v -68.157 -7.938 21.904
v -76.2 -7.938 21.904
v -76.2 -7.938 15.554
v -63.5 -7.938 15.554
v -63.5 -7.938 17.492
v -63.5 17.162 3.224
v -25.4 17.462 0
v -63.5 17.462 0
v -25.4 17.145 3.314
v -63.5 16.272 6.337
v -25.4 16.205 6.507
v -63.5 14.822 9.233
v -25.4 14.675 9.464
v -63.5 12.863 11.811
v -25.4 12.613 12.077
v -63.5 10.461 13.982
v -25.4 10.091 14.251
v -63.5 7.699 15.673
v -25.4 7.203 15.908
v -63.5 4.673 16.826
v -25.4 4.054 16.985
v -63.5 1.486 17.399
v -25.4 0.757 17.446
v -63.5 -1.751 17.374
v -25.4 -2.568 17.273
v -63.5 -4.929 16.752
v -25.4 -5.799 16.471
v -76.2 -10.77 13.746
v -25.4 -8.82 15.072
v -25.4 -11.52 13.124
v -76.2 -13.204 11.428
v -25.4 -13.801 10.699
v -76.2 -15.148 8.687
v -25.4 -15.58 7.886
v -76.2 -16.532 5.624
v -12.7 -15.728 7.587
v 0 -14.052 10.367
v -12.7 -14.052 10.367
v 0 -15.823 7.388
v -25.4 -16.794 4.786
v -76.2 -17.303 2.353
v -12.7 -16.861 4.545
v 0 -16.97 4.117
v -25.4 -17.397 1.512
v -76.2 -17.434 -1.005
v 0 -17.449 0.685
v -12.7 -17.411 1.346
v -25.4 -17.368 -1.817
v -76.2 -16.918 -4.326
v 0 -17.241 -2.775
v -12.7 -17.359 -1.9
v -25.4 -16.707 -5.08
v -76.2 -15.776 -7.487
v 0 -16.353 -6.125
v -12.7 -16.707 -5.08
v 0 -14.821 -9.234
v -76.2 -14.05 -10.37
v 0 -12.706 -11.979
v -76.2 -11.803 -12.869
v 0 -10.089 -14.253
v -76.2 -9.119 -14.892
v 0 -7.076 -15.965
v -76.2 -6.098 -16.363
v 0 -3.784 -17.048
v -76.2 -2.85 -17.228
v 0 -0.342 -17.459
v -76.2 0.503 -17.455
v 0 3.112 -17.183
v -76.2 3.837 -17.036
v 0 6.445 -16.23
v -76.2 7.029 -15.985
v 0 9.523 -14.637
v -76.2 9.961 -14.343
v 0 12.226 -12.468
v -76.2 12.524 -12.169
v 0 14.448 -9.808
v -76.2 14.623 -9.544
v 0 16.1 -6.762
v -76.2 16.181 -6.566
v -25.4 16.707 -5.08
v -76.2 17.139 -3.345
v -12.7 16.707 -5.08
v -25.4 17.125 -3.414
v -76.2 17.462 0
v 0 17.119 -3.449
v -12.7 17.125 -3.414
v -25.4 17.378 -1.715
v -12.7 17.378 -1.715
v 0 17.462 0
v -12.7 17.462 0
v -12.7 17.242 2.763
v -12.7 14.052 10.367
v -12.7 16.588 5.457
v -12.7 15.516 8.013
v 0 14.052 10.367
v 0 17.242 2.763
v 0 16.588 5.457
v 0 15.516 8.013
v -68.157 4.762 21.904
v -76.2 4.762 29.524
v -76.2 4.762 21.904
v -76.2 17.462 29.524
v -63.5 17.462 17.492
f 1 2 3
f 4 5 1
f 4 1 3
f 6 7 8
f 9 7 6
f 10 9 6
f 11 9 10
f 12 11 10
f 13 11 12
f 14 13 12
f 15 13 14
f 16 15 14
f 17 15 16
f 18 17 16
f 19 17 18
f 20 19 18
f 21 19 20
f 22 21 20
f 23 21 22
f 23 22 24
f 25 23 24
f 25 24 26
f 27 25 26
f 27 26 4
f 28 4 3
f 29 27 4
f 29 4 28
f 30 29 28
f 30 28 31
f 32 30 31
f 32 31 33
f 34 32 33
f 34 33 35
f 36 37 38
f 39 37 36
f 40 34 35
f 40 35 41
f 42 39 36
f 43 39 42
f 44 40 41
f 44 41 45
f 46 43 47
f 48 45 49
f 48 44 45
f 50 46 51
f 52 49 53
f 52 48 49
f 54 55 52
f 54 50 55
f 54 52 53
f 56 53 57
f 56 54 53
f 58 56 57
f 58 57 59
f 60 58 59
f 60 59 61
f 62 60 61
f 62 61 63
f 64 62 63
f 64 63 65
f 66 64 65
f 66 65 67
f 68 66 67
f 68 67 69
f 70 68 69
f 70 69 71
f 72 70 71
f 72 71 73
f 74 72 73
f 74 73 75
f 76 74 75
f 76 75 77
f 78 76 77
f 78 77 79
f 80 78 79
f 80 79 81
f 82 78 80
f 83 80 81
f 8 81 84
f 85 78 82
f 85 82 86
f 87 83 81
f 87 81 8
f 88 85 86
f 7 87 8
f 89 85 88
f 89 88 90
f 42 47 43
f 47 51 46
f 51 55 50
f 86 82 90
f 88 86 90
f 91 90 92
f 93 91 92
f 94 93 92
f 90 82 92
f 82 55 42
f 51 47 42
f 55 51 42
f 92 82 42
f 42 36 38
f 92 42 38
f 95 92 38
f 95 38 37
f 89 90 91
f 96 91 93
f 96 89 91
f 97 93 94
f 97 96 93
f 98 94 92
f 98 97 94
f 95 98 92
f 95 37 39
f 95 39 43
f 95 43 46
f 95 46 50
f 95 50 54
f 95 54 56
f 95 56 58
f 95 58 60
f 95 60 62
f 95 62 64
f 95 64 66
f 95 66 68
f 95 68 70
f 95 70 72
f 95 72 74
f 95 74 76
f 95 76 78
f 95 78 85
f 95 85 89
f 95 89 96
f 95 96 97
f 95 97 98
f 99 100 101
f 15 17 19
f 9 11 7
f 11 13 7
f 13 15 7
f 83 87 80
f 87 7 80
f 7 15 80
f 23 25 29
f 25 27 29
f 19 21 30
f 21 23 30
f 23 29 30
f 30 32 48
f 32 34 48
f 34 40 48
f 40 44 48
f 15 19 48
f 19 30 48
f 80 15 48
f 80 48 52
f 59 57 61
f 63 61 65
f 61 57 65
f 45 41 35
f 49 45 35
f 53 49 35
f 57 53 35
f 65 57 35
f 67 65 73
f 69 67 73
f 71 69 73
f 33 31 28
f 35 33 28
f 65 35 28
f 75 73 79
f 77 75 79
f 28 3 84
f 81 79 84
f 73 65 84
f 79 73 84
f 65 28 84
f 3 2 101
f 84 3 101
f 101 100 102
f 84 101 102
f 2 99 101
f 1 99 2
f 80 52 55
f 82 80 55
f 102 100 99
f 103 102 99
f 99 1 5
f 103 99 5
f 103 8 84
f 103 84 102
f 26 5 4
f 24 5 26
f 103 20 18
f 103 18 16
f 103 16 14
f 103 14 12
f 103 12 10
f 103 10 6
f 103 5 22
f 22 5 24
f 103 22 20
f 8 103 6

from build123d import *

# Parameters (mm, degrees)
F0_R     = 17.4625
F1_DEPTH = 76.2
F3_DEPTH = 38.1
F5_START = -38.1
F5_DEPTH = 12.7
F7_DEPTH = 25.4


with BuildPart() as f1:
    # F0 (on Right) → F1 (new body)
    with BuildSketch(Plane.YZ):
        Circle(F0_R)
    extrude(amount=-F1_DEPTH)

    # F2 (on Front) → F3 (cut, symmetric)
    with BuildSketch(Plane.XZ):
        Polygon((-12.7, -5.08), (-12.7, 0), (-12.7, 10.3669809178), (0, 10.3669809178), (0, 33.02), (-25.4, 33.02), (-25.4, -5.08), align=None)
    extrude(amount=F3_DEPTH, both=True, mode=Mode.SUBTRACT)

    # F4 (on face) → F5 (join)
    with BuildSketch(Plane.YZ.offset(-25.4).offset(F5_START)):
        with BuildLine():
            Line((-7.9375, 21.9042598667), (-7.9375, 15.5542598667))
            ThreePointArc((-7.9375, 15.5542598667), (9.1194932014, 14.8920700374), (17.4625, 0))
            Line((17.4625, 0), (17.4625, 29.5242598667))
            Line((17.4625, 29.5242598667), (4.7625, 29.5242598667))
            Line((4.7625, 29.5242598667), (4.7625, 21.9042598667))
            Line((4.7625, 21.9042598667), (-7.9375, 21.9042598667))
        make_face()
    extrude(amount=-F5_DEPTH)

    # F6 (on Front) → F7 (cut, symmetric)
    with BuildSketch(Plane.XZ):
        Polygon((-63.5, 29.5242598667), (-76.2, 29.5242598667), (-63.5, 17.4918052011), align=None)
    extrude(amount=F7_DEPTH, both=True, mode=Mode.SUBTRACT)


solid = f1.part
